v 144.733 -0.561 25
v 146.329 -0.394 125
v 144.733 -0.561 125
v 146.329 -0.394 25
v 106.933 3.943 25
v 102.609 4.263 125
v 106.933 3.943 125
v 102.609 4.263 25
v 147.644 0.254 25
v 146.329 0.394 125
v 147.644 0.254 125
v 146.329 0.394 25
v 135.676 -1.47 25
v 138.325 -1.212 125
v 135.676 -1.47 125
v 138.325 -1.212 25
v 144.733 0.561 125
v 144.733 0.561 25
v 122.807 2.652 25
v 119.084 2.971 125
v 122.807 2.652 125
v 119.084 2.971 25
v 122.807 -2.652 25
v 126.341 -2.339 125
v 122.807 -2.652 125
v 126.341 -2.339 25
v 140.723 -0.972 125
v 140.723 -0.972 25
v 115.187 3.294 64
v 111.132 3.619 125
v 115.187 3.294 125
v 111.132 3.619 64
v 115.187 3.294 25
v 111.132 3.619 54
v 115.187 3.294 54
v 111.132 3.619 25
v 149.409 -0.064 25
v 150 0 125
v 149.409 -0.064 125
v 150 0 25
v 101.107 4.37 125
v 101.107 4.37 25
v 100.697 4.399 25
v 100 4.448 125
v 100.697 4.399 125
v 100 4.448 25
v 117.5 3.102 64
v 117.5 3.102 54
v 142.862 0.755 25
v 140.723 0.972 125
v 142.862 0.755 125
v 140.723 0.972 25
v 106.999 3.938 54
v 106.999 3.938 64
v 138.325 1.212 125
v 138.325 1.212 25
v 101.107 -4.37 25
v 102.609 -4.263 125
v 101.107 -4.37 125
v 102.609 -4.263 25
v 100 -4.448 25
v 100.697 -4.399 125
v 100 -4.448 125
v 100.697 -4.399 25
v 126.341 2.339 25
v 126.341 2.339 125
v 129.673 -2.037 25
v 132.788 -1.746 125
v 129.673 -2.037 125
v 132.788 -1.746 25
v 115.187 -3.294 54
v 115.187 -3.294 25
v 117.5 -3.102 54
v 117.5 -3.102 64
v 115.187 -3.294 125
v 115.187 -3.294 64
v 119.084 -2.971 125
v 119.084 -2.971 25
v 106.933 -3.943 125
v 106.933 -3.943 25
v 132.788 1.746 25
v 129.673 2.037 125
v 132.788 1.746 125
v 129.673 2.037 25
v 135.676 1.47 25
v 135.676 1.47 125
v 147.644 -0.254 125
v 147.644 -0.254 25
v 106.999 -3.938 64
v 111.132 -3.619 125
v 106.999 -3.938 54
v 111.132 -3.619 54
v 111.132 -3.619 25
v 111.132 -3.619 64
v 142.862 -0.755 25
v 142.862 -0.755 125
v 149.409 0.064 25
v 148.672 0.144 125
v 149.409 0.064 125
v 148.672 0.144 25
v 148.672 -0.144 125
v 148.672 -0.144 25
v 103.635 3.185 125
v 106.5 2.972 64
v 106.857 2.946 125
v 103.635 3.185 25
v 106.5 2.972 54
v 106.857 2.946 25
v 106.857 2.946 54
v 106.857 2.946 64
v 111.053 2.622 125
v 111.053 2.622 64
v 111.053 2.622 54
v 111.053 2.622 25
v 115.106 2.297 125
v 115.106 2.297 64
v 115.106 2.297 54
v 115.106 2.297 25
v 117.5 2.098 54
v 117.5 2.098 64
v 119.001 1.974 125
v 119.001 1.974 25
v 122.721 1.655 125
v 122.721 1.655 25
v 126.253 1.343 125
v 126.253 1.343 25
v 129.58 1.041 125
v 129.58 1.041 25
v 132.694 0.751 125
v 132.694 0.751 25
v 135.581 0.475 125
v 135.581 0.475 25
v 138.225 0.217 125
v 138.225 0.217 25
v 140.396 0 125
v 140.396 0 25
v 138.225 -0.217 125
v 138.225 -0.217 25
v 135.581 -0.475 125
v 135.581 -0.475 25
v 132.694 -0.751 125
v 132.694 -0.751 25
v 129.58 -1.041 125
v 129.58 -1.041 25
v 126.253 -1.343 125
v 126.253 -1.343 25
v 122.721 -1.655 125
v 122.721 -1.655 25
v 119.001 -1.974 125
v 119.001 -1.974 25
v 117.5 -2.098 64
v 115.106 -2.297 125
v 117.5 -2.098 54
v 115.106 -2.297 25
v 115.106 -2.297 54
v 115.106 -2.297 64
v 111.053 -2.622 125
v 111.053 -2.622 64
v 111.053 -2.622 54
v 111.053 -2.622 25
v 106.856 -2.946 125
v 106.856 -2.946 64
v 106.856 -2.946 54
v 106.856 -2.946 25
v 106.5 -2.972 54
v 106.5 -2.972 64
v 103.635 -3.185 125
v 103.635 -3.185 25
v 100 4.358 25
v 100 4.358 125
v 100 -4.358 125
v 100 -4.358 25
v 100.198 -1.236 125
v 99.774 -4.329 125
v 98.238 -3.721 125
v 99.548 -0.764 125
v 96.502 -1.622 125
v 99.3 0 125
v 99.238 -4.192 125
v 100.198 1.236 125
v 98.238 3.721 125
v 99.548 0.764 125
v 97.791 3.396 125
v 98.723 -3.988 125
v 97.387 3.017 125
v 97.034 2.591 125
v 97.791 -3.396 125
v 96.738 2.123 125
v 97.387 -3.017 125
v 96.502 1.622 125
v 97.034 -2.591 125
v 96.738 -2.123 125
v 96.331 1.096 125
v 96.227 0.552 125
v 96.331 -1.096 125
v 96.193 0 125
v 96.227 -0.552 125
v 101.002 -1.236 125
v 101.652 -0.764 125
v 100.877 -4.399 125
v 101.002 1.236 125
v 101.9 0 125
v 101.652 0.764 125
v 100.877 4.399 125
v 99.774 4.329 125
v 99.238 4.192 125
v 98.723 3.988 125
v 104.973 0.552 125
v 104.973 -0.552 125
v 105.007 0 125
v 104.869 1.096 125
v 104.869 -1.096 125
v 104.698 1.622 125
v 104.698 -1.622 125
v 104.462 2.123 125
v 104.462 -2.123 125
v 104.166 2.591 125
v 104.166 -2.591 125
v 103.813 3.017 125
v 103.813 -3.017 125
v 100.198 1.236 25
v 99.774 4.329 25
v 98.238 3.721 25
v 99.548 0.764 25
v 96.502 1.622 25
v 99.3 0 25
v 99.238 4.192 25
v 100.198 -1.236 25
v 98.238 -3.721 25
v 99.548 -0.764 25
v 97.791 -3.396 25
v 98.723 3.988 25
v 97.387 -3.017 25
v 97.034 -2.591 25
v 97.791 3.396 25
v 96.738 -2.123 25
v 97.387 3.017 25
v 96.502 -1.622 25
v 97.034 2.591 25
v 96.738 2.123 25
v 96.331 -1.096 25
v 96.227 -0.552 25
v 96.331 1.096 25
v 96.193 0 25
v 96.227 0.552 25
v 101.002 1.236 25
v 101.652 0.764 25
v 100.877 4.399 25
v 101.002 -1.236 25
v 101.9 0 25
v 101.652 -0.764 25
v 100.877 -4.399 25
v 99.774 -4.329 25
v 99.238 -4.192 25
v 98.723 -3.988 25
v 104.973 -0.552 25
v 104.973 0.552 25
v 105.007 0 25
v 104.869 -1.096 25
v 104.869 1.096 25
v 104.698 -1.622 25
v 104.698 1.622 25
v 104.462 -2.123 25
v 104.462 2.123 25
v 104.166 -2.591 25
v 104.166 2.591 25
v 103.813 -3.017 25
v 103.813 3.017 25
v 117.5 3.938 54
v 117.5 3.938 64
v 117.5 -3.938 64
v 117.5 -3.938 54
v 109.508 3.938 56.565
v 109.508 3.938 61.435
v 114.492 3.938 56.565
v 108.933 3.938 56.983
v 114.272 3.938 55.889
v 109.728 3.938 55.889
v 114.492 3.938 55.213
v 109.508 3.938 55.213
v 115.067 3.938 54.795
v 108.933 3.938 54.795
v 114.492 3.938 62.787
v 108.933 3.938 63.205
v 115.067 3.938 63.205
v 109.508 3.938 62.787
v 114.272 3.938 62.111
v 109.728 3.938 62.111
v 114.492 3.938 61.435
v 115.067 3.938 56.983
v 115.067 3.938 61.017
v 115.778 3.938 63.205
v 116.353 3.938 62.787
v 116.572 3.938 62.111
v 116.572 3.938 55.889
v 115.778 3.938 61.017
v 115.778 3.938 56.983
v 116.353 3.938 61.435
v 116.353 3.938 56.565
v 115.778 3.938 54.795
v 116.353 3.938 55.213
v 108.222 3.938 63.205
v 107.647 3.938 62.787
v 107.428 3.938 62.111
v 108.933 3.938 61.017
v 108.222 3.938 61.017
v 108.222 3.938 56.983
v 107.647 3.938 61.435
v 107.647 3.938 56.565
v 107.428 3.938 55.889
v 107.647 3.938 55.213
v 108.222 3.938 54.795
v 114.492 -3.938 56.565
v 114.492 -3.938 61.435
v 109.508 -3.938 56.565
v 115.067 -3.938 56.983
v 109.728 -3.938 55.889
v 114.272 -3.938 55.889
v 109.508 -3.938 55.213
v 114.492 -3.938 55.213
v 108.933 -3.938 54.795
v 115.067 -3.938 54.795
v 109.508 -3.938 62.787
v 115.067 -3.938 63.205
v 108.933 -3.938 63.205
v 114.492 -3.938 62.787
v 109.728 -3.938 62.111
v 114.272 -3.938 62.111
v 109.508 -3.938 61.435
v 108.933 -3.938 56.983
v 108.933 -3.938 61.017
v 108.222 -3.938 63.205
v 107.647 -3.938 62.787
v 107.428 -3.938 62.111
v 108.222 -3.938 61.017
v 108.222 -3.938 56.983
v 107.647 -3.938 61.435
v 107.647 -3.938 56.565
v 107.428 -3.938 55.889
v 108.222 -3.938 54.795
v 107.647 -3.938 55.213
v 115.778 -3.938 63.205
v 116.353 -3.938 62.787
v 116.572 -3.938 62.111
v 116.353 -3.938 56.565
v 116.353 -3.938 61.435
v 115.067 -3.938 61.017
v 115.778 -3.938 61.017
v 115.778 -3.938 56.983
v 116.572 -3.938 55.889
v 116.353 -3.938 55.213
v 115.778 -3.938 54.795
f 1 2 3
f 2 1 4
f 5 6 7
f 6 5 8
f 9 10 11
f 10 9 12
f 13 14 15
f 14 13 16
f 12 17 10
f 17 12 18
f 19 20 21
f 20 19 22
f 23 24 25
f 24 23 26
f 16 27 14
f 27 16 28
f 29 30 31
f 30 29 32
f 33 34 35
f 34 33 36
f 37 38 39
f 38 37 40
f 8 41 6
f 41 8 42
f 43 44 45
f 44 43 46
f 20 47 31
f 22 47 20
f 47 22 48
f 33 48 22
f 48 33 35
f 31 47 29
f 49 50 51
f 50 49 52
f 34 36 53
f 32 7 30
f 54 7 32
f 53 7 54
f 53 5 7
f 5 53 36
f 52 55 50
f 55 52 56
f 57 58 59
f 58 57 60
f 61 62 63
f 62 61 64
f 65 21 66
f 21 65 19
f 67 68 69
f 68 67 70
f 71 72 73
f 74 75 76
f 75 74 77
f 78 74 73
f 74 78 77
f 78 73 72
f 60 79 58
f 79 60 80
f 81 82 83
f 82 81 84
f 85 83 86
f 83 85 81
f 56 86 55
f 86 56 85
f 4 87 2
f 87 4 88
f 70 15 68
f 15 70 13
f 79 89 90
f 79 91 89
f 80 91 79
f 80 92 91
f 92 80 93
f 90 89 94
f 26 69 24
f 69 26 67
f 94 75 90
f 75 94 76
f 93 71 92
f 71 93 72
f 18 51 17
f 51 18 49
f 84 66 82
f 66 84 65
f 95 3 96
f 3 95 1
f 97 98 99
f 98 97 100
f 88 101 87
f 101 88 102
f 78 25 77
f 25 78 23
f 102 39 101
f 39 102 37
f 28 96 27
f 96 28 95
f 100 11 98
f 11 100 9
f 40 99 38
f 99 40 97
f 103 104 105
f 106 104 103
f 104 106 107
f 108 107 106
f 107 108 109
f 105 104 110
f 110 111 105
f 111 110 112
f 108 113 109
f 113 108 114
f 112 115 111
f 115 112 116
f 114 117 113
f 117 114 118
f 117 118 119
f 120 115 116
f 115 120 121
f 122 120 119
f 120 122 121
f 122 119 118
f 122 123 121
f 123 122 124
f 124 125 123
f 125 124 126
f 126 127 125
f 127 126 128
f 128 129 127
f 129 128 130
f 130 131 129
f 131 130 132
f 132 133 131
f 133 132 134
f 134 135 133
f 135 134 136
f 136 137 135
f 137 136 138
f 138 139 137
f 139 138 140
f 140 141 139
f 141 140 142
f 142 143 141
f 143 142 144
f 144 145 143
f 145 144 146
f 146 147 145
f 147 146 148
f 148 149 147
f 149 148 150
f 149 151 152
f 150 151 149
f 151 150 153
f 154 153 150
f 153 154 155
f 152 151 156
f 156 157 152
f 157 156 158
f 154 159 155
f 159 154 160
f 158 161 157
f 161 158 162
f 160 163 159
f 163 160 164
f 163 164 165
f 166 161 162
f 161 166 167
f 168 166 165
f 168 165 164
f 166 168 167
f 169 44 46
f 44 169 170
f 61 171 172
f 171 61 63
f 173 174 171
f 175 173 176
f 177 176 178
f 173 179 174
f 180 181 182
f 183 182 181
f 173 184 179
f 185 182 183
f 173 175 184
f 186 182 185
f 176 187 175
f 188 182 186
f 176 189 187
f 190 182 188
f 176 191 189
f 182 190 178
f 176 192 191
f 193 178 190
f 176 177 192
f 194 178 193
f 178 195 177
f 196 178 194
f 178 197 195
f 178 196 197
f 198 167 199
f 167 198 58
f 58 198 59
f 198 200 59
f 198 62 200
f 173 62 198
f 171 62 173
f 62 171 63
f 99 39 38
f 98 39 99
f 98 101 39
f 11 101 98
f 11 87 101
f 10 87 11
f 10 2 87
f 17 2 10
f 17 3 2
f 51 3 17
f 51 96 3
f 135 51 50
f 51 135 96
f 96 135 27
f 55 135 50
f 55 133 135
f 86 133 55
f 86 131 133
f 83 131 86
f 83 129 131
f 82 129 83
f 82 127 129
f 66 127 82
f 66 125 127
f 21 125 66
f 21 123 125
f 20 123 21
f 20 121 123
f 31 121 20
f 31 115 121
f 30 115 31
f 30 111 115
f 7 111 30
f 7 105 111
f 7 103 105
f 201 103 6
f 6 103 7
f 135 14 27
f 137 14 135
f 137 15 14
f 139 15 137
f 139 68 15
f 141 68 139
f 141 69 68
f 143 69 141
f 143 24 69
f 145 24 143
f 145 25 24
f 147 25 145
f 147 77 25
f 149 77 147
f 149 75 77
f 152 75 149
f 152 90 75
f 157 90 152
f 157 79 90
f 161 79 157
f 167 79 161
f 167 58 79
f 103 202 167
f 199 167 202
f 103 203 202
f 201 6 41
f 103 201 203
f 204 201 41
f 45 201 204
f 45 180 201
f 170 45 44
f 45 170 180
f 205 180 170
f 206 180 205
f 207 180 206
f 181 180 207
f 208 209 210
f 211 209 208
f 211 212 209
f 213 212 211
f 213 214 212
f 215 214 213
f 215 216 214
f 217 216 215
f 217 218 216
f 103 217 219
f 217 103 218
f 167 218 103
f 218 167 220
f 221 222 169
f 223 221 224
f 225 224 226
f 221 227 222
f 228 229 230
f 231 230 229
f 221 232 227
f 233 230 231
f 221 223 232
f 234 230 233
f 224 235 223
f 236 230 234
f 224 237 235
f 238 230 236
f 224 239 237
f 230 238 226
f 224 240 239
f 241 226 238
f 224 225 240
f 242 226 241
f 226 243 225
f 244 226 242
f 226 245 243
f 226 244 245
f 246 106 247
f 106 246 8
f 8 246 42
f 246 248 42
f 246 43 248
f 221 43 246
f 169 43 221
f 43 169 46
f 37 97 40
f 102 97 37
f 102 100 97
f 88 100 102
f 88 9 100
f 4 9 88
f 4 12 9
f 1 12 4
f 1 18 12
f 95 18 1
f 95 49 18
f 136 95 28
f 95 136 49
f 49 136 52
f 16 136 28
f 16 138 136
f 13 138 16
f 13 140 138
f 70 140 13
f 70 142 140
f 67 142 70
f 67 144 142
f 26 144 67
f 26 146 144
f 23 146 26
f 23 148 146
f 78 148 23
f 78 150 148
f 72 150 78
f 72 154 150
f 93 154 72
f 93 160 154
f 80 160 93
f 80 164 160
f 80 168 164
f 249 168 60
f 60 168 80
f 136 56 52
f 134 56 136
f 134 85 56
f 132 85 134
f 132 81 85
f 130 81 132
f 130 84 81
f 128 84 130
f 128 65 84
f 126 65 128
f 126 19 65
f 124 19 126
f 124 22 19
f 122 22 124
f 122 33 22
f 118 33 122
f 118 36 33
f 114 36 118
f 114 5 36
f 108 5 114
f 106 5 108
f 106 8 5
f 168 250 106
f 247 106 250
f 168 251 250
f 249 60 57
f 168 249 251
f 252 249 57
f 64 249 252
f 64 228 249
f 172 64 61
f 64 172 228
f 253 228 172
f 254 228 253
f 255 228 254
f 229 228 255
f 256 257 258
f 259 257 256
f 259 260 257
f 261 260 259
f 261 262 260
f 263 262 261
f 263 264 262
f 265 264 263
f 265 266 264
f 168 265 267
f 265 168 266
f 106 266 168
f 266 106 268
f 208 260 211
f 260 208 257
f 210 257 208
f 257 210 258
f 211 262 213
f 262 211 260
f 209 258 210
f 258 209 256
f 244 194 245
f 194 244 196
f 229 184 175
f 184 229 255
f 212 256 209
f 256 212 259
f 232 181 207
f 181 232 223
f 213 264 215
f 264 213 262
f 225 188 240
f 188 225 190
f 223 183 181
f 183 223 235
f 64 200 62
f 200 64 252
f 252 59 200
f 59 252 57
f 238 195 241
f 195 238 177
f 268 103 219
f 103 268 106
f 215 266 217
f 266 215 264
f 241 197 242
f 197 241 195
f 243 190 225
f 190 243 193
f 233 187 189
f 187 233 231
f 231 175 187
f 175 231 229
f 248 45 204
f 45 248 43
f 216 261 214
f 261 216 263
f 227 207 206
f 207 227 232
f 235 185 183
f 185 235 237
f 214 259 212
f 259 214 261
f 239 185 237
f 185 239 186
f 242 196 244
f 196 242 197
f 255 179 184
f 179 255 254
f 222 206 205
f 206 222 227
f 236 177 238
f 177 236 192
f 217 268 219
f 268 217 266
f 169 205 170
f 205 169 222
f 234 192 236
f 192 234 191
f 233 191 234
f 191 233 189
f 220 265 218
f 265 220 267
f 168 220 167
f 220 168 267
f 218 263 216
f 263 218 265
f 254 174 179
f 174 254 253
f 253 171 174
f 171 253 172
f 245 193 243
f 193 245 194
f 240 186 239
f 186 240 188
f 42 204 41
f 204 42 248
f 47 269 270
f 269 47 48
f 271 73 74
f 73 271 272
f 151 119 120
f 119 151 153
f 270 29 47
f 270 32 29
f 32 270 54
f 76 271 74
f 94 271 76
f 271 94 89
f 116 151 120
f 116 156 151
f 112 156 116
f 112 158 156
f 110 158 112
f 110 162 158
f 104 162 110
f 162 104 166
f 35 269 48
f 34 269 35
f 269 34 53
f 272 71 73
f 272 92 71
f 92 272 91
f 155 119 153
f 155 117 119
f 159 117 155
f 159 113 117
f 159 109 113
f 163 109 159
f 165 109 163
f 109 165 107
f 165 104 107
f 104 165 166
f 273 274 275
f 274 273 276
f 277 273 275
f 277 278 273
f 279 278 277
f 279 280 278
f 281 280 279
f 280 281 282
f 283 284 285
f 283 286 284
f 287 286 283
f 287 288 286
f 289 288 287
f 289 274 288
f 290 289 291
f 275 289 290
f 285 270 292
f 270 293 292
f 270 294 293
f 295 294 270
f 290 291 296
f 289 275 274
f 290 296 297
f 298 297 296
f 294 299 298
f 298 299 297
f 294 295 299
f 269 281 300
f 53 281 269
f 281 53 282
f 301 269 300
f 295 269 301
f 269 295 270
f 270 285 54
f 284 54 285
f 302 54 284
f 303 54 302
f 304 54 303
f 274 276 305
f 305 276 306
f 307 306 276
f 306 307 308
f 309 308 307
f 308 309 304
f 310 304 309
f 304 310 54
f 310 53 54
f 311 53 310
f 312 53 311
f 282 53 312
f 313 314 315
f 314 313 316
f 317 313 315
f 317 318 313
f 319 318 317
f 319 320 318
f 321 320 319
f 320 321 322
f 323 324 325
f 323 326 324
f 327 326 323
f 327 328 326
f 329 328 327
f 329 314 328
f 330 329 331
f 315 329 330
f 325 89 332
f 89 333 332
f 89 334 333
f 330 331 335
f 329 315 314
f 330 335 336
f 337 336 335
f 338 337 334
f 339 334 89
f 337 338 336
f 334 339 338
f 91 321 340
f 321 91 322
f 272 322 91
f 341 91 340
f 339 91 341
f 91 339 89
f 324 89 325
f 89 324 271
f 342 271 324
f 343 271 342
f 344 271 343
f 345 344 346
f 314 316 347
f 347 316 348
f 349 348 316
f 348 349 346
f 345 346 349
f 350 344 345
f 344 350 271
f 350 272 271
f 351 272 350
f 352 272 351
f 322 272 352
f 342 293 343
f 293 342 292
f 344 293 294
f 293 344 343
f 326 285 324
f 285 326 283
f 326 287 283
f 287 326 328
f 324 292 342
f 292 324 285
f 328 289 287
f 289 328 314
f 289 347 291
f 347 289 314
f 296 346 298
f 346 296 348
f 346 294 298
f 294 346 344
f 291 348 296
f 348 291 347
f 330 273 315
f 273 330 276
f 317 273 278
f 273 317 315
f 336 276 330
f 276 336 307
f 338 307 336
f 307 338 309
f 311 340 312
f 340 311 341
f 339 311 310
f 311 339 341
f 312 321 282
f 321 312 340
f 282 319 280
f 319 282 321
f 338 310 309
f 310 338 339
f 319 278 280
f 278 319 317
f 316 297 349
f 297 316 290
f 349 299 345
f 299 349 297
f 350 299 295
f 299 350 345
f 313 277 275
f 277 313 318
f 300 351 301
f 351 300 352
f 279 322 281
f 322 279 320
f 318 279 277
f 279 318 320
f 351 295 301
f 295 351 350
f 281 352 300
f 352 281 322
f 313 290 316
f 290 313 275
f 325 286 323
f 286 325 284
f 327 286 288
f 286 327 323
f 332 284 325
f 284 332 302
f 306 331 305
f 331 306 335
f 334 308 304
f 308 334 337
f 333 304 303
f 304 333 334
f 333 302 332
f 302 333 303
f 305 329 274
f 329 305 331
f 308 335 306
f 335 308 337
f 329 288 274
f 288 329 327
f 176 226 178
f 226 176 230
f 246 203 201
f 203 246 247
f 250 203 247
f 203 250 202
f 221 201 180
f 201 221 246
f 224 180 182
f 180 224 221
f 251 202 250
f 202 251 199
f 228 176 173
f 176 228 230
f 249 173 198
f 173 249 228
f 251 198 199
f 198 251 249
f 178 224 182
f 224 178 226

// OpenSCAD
// file: ../lib/TextGenerator.scad
//Draw text
scale([4,4,4]) drawtext("Hello World!");

//Draw character set
//scale([2,2,2]) drawtext(" !\"#$%&'()*+,-./0123456789:;<=>?@ABCDEFGHIJKLMNOPQRSTUVWXYZ[\\]^_`abcdefghijklmnopqrstuvwxyz{|}");

module drawtext(text) {
	//Characters
	chars = " !\"#$%&'()*+,-./0123456789:;<=>?@ABCDEFGHIJKLMNOPQRSTUVWXYZ[\\]^_`abcdefghijklmnopqrstuvwxyz{|}";

	//Chracter table defining 5x7 characters
	//Adapted from: http://www.geocities.com/dinceraydin/djlcdsim/chartable.js
	char_table = [ [ 0, 0, 0, 0, 0, 0, 0],
                  [ 4, 0, 4, 4, 4, 4, 4],
                  [ 0, 0, 0, 0,10,10,10],
                  [10,10,31,10,31,10,10],
                  [ 4,30, 5,14,20,15, 4],
                  [ 3,19, 8, 4, 2,25,24],
                  [13,18,21, 8,20,18,12],
                  [ 0, 0, 0, 0, 8, 4,12],
                  [ 2, 4, 8, 8, 8, 4, 2],
                  [ 8, 4, 2, 2, 2, 4, 8],
                  [ 0, 4,21,14,21, 4, 0],
                  [ 0, 4, 4,31, 4, 4, 0],
                  [ 8, 4,12, 0, 0, 0, 0],
                  [ 0, 0, 0,31, 0, 0, 0],
                  [12,12, 0, 0, 0, 0, 0],
                  [ 0,16, 8, 4, 2, 1, 0],
                  [14,17,25,21,19,17,14],
                  [14, 4, 4, 4, 4,12, 4],
                  [31, 8, 4, 2, 1,17,14],
                  [14,17, 1, 2, 4, 2,31],
                  [ 2, 2,31,18,10, 6, 2],
                  [14,17, 1, 1,30,16,31],
                  [14,17,17,30,16, 8, 6],
                  [ 8, 8, 8, 4, 2, 1,31],
                  [14,17,17,14,17,17,14],
                  [12, 2, 1,15,17,17,14],
                  [ 0,12,12, 0,12,12, 0],
                  [ 8, 4,12, 0,12,12, 0],
                  [ 2, 4, 8,16, 8, 4, 2],
                  [ 0, 0,31, 0,31, 0, 0],
                  [16, 8, 4, 2, 4, 8,16],
                  [ 4, 0, 4, 2, 1,17,14],
                  [14,21,21,13, 1,17,14],
                  [17,17,31,17,17,17,14],
                  [30,17,17,30,17,17,30],
                  [14,17,16,16,16,17,14],
                  [30,17,17,17,17,17,30],
                  [31,16,16,30,16,16,31],
                  [16,16,16,30,16,16,31],
                  [15,17,17,23,16,17,14],
                  [17,17,17,31,17,17,17],
                  [14, 4, 4, 4, 4, 4,14],
                  [12,18, 2, 2, 2, 2, 7],
                  [17,18,20,24,20,18,17],
                  [31,16,16,16,16,16,16],
                  [17,17,17,21,21,27,17],
                  [17,17,19,21,25,17,17],
                  [14,17,17,17,17,17,14],
                  [16,16,16,30,17,17,30],
                  [13,18,21,17,17,17,14],
                  [17,18,20,30,17,17,30],
                  [30, 1, 1,14,16,16,15],
                  [ 4, 4, 4, 4, 4, 4,31],
                  [14,17,17,17,17,17,17],
                  [ 4,10,17,17,17,17,17],
                  [10,21,21,21,17,17,17],
                  [17,17,10, 4,10,17,17],
                  [ 4, 4, 4,10,17,17,17],
                  [31,16, 8, 4, 2, 1,31],
                  [14, 8, 8, 8, 8, 8,14],
                  [ 0, 1, 2, 4, 8,16, 0],
                  [14, 2, 2, 2, 2, 2,14],
                  [ 0, 0, 0, 0,17,10, 4],
                  [31, 0, 0, 0, 0, 0, 0],
                  [ 0, 0, 0, 0, 2, 4, 8],
                  [15,17,15, 1,14, 0, 0],
                  [30,17,17,25,22,16,16],
                  [14,17,16,16,14, 0, 0],
                  [15,17,17,19,13, 1, 1],
                  [14,16,31,17,14, 0, 0],
                  [ 8, 8, 8,28, 8, 9, 6],
                  [14, 1,15,17,15, 0, 0],
                  [17,17,17,25,22,16,16],
                  [14, 4, 4, 4,12, 0, 4],
                  [12,18, 2, 2, 2, 6, 2],
                  [18,20,24,20,18,16,16],
                  [14, 4, 4, 4, 4, 4,12],
                  [17,17,21,21,26, 0, 0],
                  [17,17,17,25,22, 0, 0],
                  [14,17,17,17,14, 0, 0],
                  [16,16,30,17,30, 0, 0],
                  [ 1, 1,15,19,13, 0, 0],
                  [16,16,16,25,22, 0, 0],
                  [30, 1,14,16,15, 0, 0],
                  [ 6, 9, 8, 8,28, 8, 8],
                  [13,19,17,17,17, 0, 0],
                  [ 4,10,17,17,17, 0, 0],
                  [10,21,21,17,17, 0, 0],
                  [17,10, 4,10,17, 0, 0],
                  [14, 1,15,17,17, 0, 0],
                  [31, 8, 4, 2,31, 0, 0],
                  [ 2, 4, 4, 8, 4, 4, 2],
                  [ 4, 4, 4, 4, 4, 4, 4],
                  [ 8, 4, 4, 2, 4, 4, 8] ];

	//Binary decode table
	dec_table = [ "00000", "00001", "00010", "00011", "00100", "00101",
  	            "00110", "00111", "01000", "01001", "01010", "01011",
  	            "01100", "01101", "01110", "01111", "10000", "10001",
  	            "10010", "10011", "10100", "10101", "10110", "10111",
	            "11000", "11001", "11010", "11011", "11100", "11101",
	            "11110", "11111" ];

	//Process string one character at a time
	for(itext = [0:len(text)-1]) {
		//Convert character to index
		ichar = search(text[itext],chars,1)[0];

        //Decode character - rows
        for(irow = [0:6]) {
            //Select value to draw from table
            val = dec_table[char_table[ichar][irow]];

            //Decode character - cols
            for(icol = [0:4]) {
                // Retrieve bit to draw
                bit = search(val[icol],"01",1)[0];

                if(bit) {
                    //Output cube
                    translate([icol + (6*itext), irow, 0])
                        cube([1.0001,1.0001,1]);
                }
            }
        }
	}
}
// file: ../lib/naca4.scad
// Naca4.scad - library for parametric airfoils of 4 digit NACA series
// Code: Rudolf Huttary, Berlin
// June 2015
// commercial use prohibited


// general use: for more examples refer to sampler.scad
// naca = naca digits or 3el vector  (default = 12 or [0, 0, .12])
// L    = chord length [mm]      (default= 100)
// N    = # sample points        (default= 81)
// h    = height [mm]            (default= 1)
// open = close at the thin end? (default = true)
// two equivalent example calls
 airfoil(naca = 2408, L = 60, N=1001, h = 30, open = false);
// airfoil(naca = [.2, .4, .32], L = 60, N=1001, h = 30, open = false);

module help()
{
  echo(str("\n\nList of signatures in lib:\n=================\n",
  "module airfoil(naca=2412, L = 100, N = 81, h = 1, open = false) - renders airfoil object\n",
  "module airfoil(naca=[.2, .4, .12], L = 100, N = 81, h = 1, open = false) - renders airfoil object using percentage for camber,  camber distance and thicknes\n",
  "function airfoil_data(naca=12, L = 100, N = 81, open = false)\n",
  "=================\n"));
}

help();
// this is the object
module airfoil(naca=12, L = 100, N = 81, h = 1, open = false)
{
  linear_extrude(height = h)
  polygon(points = airfoil_data(naca, L, N, open));
}

module hollow_airfoil(naca=12, L = 100, N = 81, h = 1, open = false, wall_thickness = 1)
{
    if (open){
        linear_extrude(height = h)

        if (wall_thickness>0){
            difference(){
                polygon(points = airfoil_data(naca, L, N, false));
                offset(delta = - wall_thickness, chamfer = false) polygon(points = airfoil_data(naca, L, N, open = false));
            }
        }
        else{
            difference(){
                offset(delta = - wall_thickness, chamfer = false) polygon(points = airfoil_data(naca, L, N, open = false));
                polygon(points = airfoil_data(naca, L, N, false));
            }
        }
    }
    else{

        linear_extrude(height = abs(wall_thickness))
            polygon(points = airfoil_data(naca, L, N, false));

        linear_extrude(height = h)
            difference(){
                polygon(points = airfoil_data(naca, L, N, open));
                offset(delta = - wall_thickness) polygon(points = airfoil_data(naca, L, N, open = false));
            }

        translate([0,0, h - wall_thickness])
            linear_extrude(height = abs(wall_thickness))
                polygon(points = airfoil_data(naca, L, N, false));

    }
}


// this is the main function providing the airfoil data
function airfoil_data(naca=12, L = 100, N = 81, open = false) =
  let(Na = len(naca)!=3?NACA(naca):naca)
  let(A = [.2969, -0.126, -.3516, .2843, open?-0.1015:-0.1036])
  [for (b=[-180:360/(N):179.99])
    let (x = (1-cos(b))/2)
    let(yt = sign(b)*Na[2]/.2*(A*[sqrt(x), x, x*x, x*x*x, x*x*x*x]))
    Na[0]==0?L*[x, yt]:L*camber(x, yt, Na[0], Na[1], sign(b))];


function trailing_edge_angle(naca=12, open = false) =
  let(Na = len(naca)!=3?NACA(naca):naca)
  let(A = [.2969, -0.126, -.3516, .2843, open?-0.1015:-0.1036])
  let (x =0.999)  // set x near to airfoil trailing edge
  let(yt = Na[2]/.2*(A*[sqrt(x), x, x*x, x*x*x, x*x*x*x])) // calculate distance from x-axis at previously set position
  atan2(yt,1-x);  // calculate angle of triangle between end of airfoil. The triange height corresponds to previously calculated distance from x-axis

function surface_angle(x = 0.5, naca=12, open = false) =
  let(Na = len(naca)!=3?NACA(naca):naca)
  let(A = [0.2969, -0.126, -0.3516, 0.2843, open?-0.1015:-0.1036])
  let(dy = Na[2]/0.2*(A*[(1/2)*(1/sqrt(x)), 1, 2*x, 3*x*x, 4*x*x*x])) // calculate derivative of airfoil function at the x point
  atan(dy);  // calculate  the angle from function derivative

function surface_distance(x = 0.5, naca=12, open = false) =
  let(Na = len(naca)!=3?NACA(naca):naca)
  let(A = [0.2969, -0.126, -0.3516, 0.2843, open?-0.1015:-0.1036])
  Na[2]/.2*(A*[sqrt(x), x, x*x, x*x*x, x*x*x*x]); // calculate distance from x-axis at previously set position

// helper functions
function NACA(naca) =
  let (M = floor(naca/1000))
  let (P = floor((naca-M*1000)/100))
  [M/100, P/10, floor(naca-M*1000-P*100)/100];

function camber(x, y, M, P, upper) =
  let(yc = (x<P)?M/P/P*(2*P*x-x*x): M/(1-P)/(1-P)*(1 - 2*P + 2*P*x -x*x))
  let(dy = (x<P)?2*M/P/P*(P-x):2*M/(1-P)/(1-P)*(P-x))
  let(th = atan(dy))
  [upper ? x - y*sin(th):x + y*sin(th), upper ? yc + y*cos(th):yc - y*cos(th)];
// main file
include <../../parameters.scad>
use <../666_1028.scad>

draft = false;

666_1028_rudder(draft);
